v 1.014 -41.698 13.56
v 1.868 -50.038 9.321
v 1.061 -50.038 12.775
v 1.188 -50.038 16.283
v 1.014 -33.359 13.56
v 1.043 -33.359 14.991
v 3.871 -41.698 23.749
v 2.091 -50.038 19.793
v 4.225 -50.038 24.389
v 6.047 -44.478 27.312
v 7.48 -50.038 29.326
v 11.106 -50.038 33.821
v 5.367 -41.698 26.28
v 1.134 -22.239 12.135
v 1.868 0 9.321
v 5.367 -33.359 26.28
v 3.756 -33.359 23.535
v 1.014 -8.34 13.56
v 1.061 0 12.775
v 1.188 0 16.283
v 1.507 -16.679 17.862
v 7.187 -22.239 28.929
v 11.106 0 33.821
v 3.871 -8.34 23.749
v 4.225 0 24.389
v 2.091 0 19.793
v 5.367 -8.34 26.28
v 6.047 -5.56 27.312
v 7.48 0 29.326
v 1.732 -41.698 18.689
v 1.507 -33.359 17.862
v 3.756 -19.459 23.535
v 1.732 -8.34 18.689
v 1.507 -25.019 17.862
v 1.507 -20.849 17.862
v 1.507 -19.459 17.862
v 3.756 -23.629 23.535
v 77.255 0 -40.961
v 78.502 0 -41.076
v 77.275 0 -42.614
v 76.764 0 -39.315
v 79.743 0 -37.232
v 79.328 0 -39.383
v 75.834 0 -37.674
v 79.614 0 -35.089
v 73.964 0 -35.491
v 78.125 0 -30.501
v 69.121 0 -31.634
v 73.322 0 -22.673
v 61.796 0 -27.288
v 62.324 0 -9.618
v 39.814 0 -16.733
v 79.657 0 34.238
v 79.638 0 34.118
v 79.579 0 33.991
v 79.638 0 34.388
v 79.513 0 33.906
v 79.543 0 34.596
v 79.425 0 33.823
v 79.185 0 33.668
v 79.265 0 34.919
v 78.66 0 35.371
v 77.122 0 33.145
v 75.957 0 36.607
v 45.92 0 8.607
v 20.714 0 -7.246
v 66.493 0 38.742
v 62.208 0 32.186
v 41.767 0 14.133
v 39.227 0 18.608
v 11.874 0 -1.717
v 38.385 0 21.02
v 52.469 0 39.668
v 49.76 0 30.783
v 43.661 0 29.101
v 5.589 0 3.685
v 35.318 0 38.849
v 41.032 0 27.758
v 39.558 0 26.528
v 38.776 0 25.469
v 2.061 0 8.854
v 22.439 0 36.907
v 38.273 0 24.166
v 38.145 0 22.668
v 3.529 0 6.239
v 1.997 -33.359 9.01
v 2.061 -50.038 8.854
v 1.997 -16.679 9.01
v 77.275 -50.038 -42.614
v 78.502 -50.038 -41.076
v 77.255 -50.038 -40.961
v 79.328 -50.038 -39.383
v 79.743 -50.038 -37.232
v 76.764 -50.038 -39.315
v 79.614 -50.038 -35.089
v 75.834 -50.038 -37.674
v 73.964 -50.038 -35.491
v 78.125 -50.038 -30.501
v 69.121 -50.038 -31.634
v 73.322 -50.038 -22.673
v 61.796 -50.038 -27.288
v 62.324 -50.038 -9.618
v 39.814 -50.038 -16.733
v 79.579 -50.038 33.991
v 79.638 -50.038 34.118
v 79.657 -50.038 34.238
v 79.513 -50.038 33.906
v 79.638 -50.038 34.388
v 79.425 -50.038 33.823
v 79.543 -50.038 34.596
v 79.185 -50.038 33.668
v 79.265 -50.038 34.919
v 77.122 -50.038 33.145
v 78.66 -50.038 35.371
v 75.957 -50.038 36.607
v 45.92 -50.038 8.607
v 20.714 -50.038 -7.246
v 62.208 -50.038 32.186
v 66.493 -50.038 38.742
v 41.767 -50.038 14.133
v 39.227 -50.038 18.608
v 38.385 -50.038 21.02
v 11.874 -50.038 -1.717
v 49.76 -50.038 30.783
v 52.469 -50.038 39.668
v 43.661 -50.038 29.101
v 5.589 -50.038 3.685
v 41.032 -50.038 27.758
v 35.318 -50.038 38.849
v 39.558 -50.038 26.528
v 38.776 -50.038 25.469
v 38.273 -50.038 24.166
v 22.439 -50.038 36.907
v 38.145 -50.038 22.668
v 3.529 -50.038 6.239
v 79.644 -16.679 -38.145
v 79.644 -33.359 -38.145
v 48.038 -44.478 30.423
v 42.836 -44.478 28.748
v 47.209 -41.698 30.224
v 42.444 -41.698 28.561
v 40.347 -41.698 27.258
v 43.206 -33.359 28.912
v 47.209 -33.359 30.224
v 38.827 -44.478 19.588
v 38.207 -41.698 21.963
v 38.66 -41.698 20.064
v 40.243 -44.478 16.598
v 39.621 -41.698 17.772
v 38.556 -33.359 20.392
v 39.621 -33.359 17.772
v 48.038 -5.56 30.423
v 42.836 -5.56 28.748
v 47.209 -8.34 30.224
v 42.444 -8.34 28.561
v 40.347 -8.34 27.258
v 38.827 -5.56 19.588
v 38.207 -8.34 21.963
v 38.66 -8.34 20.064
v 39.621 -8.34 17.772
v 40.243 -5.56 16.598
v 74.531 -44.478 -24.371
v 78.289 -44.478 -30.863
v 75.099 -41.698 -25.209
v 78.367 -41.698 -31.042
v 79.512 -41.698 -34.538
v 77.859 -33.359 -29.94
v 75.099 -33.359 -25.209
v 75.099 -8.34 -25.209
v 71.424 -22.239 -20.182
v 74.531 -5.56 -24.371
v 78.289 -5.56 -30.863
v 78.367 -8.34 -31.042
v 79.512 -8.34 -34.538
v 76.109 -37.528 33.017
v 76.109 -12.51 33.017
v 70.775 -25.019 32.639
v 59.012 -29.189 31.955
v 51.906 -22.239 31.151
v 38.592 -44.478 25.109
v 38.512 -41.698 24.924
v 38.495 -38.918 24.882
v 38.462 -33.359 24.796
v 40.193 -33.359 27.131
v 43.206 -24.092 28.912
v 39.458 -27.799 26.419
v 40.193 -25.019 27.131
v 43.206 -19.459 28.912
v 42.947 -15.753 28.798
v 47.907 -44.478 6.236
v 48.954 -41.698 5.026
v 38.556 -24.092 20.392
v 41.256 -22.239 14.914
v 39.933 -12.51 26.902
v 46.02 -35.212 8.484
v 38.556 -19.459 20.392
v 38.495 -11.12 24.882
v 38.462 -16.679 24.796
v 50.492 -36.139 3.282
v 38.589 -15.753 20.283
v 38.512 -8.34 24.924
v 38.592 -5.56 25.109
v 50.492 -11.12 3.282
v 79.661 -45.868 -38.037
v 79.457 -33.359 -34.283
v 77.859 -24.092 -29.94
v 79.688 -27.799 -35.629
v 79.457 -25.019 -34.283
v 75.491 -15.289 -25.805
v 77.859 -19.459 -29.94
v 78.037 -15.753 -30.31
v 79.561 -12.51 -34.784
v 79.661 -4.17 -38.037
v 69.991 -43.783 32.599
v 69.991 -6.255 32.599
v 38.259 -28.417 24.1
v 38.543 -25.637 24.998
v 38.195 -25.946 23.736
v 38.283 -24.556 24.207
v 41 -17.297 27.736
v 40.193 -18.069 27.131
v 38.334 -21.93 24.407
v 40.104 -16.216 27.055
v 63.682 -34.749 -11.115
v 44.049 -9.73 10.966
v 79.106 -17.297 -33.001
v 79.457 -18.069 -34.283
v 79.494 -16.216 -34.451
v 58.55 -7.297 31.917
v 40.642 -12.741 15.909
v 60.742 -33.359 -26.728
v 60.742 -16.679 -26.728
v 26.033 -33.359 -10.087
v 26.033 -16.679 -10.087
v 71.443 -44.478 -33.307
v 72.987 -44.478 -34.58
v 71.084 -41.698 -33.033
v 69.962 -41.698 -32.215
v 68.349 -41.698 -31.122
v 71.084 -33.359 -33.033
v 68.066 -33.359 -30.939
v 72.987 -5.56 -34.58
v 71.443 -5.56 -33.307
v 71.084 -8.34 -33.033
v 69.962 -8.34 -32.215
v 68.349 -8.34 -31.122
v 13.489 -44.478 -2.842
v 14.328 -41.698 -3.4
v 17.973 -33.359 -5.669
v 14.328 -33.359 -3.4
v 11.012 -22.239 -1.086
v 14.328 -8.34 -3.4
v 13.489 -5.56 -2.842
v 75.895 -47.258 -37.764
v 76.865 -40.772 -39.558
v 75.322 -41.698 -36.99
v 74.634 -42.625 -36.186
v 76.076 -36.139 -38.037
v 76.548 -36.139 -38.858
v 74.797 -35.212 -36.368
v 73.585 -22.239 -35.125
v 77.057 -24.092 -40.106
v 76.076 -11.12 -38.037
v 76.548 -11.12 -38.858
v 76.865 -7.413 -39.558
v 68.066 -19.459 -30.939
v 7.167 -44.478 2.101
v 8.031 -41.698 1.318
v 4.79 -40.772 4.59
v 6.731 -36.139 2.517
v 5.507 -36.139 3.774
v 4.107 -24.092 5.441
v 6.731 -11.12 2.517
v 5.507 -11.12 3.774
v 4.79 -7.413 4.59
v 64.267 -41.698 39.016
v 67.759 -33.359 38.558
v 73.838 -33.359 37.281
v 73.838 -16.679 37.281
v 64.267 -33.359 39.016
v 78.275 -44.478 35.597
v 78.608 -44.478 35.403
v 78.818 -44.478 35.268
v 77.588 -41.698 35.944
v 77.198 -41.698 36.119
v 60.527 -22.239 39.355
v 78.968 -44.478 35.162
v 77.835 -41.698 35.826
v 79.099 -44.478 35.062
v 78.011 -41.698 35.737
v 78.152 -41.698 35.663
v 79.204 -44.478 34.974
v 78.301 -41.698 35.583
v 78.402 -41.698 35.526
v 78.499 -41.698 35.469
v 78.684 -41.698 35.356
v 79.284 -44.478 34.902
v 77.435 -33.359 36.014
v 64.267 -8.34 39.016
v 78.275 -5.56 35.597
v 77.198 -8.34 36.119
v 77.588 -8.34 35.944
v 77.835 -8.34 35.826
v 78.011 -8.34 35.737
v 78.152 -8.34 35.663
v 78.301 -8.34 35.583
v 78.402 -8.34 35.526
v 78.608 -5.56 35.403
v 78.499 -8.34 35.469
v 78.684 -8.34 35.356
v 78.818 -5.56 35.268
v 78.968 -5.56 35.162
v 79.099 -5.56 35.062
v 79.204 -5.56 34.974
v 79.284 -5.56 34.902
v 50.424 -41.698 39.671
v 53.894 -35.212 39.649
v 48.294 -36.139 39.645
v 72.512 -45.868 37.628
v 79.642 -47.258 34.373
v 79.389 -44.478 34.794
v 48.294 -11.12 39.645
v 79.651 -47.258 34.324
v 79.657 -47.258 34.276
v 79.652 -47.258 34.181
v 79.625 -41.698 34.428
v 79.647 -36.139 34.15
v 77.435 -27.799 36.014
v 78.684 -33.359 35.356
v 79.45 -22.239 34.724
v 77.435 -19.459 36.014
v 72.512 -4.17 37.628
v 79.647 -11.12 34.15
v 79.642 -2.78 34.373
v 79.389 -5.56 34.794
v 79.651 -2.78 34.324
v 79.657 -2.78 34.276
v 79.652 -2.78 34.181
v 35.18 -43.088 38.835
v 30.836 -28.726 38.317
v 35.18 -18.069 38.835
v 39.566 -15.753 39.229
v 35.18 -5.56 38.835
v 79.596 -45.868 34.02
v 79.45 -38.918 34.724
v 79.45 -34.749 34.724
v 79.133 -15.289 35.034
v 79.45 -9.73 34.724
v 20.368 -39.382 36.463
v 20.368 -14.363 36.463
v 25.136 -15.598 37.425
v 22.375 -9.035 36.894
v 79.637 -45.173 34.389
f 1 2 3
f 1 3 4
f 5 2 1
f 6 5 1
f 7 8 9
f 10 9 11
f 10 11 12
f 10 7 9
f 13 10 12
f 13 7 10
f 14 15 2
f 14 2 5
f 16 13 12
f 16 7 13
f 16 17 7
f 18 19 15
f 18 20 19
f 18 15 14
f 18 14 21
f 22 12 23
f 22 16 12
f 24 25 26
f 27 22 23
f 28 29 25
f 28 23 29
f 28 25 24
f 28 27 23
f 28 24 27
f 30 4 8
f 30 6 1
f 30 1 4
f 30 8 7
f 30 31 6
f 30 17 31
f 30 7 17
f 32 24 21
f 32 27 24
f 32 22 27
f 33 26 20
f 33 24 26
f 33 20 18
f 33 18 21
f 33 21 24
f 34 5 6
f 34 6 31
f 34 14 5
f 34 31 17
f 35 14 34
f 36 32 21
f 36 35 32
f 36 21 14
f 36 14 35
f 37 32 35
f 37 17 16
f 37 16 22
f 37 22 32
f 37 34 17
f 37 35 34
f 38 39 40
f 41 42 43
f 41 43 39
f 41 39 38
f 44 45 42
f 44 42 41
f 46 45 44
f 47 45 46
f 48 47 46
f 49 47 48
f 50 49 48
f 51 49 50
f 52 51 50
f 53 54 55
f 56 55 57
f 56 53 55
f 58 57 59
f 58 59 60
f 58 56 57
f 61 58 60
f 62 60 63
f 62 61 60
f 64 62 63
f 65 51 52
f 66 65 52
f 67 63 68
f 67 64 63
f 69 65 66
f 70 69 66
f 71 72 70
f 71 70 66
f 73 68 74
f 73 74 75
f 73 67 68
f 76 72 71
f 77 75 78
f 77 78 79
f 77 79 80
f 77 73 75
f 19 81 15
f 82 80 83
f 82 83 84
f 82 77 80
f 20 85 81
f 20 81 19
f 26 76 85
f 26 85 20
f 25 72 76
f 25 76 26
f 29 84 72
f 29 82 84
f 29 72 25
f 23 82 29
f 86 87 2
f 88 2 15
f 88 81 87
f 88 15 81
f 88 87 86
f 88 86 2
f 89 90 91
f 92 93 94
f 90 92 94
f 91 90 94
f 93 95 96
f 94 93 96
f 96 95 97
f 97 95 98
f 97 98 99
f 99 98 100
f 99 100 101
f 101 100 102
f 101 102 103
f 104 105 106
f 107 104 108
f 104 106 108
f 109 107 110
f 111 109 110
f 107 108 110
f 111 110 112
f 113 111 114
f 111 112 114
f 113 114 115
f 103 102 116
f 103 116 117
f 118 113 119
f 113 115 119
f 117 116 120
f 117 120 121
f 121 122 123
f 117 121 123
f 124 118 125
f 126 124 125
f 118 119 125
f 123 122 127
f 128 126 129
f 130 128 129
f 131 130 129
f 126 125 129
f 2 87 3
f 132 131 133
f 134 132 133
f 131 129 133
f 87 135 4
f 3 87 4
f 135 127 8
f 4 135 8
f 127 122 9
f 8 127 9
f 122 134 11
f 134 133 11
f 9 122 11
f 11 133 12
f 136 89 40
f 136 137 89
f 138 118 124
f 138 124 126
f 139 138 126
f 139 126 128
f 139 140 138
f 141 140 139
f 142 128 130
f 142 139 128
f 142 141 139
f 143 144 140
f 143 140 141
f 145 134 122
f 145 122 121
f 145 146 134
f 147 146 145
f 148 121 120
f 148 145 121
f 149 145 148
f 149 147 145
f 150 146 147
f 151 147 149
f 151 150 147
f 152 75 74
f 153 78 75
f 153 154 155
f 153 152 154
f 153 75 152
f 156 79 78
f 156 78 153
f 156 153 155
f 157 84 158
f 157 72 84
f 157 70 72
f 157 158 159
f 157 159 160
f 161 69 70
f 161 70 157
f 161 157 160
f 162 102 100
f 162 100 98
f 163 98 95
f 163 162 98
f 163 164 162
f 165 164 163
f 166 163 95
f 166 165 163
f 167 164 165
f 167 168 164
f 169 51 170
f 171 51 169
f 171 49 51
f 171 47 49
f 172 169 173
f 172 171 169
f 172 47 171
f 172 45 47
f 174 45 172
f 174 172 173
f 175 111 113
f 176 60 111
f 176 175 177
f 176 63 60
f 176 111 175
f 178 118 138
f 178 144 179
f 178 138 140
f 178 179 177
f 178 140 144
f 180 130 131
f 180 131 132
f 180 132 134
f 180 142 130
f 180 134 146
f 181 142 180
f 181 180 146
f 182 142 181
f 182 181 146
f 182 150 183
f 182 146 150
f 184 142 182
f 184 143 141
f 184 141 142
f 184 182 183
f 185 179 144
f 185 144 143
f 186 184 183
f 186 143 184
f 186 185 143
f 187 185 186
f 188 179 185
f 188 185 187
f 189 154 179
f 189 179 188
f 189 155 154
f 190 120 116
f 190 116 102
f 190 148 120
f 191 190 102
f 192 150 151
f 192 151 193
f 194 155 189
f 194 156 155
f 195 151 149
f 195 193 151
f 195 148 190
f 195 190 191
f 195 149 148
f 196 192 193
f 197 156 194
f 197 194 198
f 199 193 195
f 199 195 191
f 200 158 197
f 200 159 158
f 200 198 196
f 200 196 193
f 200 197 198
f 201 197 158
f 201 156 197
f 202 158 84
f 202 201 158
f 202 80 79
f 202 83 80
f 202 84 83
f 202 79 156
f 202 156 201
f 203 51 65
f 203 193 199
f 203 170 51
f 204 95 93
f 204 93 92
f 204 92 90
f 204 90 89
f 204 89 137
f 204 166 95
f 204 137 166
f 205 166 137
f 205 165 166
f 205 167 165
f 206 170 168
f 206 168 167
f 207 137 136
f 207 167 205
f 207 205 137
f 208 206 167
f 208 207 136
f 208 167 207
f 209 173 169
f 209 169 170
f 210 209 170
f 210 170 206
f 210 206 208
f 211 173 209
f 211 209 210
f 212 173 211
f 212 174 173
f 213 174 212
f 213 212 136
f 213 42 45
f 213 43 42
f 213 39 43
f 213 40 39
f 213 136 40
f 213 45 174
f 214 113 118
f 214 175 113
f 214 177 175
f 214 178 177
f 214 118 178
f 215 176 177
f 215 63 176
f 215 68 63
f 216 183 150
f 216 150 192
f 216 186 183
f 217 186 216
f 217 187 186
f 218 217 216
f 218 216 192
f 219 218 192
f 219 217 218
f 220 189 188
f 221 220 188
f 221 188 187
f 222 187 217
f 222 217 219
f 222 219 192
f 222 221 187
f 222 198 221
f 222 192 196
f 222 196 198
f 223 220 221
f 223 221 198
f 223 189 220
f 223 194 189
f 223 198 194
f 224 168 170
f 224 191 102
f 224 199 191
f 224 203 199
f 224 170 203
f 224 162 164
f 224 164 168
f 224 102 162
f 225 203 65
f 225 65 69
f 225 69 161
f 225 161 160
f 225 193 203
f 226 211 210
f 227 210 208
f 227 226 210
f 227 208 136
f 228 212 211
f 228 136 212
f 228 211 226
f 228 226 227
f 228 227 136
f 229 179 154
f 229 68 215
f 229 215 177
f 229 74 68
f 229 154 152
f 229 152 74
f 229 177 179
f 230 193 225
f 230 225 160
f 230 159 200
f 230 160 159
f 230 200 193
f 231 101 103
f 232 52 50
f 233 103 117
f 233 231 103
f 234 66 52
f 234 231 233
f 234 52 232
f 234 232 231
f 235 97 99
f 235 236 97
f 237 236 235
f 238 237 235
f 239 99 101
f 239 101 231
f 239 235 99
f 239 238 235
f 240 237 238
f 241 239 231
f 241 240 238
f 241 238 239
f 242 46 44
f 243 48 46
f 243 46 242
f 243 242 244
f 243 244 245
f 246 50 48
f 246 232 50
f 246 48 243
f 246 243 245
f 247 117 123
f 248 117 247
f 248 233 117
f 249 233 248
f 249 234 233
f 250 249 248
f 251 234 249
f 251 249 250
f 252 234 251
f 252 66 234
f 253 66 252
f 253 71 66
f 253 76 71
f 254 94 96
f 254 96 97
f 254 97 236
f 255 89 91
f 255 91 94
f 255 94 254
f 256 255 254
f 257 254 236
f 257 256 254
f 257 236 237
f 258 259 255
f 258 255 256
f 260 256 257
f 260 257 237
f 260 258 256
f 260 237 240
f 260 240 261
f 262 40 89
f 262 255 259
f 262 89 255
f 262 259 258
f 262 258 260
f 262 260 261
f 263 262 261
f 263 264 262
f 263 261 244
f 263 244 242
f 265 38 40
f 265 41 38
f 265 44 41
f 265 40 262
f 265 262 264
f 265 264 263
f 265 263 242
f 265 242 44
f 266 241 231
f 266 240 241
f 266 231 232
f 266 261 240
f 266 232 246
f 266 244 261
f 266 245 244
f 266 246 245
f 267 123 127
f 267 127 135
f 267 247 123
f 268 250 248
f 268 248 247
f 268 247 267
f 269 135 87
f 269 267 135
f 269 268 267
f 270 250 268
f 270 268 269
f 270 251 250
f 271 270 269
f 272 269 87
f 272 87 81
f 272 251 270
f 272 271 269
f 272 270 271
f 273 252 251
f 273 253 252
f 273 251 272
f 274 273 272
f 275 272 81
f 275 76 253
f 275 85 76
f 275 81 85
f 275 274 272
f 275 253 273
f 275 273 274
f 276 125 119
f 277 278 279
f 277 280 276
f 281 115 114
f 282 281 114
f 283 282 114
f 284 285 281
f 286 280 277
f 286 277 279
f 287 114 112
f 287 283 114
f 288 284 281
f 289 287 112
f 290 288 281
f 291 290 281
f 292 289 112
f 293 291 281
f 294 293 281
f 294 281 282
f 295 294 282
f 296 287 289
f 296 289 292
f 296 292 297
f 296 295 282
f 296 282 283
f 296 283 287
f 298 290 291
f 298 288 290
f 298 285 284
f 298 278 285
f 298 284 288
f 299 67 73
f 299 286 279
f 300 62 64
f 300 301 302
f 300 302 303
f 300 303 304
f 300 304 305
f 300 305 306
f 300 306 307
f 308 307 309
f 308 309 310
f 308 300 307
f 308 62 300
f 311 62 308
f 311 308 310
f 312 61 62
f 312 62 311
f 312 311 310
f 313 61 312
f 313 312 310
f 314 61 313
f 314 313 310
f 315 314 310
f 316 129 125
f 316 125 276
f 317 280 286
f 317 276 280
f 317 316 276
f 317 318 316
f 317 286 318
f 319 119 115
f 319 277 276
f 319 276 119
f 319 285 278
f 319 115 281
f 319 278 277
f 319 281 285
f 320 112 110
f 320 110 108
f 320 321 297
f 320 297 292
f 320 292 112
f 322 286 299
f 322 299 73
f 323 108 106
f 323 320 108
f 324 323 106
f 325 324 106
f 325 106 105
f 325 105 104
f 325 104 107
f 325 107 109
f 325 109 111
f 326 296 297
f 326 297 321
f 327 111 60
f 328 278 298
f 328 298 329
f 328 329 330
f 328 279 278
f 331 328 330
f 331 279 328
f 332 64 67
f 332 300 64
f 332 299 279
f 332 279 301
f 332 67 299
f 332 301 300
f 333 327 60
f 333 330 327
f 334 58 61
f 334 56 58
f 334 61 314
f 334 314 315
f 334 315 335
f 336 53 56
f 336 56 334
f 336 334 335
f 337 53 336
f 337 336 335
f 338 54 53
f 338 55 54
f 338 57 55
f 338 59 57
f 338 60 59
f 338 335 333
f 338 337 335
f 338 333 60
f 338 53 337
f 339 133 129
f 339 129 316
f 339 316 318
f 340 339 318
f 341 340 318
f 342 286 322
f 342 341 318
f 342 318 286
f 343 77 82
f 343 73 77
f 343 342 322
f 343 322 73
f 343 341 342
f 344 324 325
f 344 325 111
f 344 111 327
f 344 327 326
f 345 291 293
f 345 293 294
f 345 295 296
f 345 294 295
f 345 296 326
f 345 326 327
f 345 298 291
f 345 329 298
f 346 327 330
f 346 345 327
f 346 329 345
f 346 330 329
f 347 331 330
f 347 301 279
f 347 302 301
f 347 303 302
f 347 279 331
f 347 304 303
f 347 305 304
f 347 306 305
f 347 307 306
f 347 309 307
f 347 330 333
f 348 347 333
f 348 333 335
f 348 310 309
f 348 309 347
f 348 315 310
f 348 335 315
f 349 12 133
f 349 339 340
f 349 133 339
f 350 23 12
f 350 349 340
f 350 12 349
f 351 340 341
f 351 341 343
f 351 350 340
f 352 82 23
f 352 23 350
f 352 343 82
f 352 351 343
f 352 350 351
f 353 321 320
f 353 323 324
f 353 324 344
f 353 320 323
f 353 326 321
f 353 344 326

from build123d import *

# Parameters (mm, degrees)
F1_DEPTH = 50.038


with BuildPart() as f1:
    # F0 (on Front) → F1 (new body)
    with BuildSketch(Plane.XZ):
        with BuildLine():
            add(Edge.make_bspline(
                [(79.1851501145, 33.667985141), (75.0187026574, 31.503252156), (-2.4379861385, 37.6481391794), (87.3723170721, -25.341323607), (78.5399634882, -41.3093671709), (77.274699503, -42.6143057432)],
                knots=[0, 0, 0, 0, 0.1298884954, 0.304379438, 0.3223113992, 0.3223113992, 0.3223113992, 0.3223113992], degree=3))
            add(Edge.make_bspline(
                [(11.1058921605, 33.8209956614), (14.4397051782, 35.019855662), (34.6725145866, 40.4657294514), (69.9810109278, 40.6166271778), (80.8246080885, 34.5197872555), (79.1851501145, 33.667985141)],
                knots=[0.771168741, 0.771168741, 0.771168741, 0.771168741, 0.8043873432, 0.948890096, 1, 1, 1, 1], degree=3))
            add(Edge.make_bspline(
                [(1.8684788003, 9.321059509), (-1.3841643437, 17.6719319964), (5.2084741646, 26.9707864304), (11.1058921562, 33.8209956571)],
                knots=[0.5042673301, 0.5042673301, 0.5042673301, 0.5042673301, 0.5962648223, 0.5962648223, 0.5962648223, 0.5962648223], degree=3))
            add(Edge.make_bspline(
                [(2.0611278183, 8.853789435), (1.9972476452, 9.0103169518), (1.9330033894, 9.1660713289), (1.8684788033, 9.3210595026)],
                knots=[0.6304405304, 0.6304405304, 0.6304405304, 0.6304405304, 0.6322791361, 0.6322791361, 0.6322791361, 0.6322791361], degree=3))
            add(Edge.make_bspline(
                [(77.274699503, -42.6143057432), (79.4681300041, -26.5906033467), (11.0260514961, -11.7528920899), (2.0611278183, 8.853789435)],
                knots=[0.2745709496, 0.2745709496, 0.2745709496, 0.2745709496, 0.5025477969, 0.5025477969, 0.5025477969, 0.5025477969], degree=3))
        make_face()
    extrude(amount=F1_DEPTH)


solid = f1.part
